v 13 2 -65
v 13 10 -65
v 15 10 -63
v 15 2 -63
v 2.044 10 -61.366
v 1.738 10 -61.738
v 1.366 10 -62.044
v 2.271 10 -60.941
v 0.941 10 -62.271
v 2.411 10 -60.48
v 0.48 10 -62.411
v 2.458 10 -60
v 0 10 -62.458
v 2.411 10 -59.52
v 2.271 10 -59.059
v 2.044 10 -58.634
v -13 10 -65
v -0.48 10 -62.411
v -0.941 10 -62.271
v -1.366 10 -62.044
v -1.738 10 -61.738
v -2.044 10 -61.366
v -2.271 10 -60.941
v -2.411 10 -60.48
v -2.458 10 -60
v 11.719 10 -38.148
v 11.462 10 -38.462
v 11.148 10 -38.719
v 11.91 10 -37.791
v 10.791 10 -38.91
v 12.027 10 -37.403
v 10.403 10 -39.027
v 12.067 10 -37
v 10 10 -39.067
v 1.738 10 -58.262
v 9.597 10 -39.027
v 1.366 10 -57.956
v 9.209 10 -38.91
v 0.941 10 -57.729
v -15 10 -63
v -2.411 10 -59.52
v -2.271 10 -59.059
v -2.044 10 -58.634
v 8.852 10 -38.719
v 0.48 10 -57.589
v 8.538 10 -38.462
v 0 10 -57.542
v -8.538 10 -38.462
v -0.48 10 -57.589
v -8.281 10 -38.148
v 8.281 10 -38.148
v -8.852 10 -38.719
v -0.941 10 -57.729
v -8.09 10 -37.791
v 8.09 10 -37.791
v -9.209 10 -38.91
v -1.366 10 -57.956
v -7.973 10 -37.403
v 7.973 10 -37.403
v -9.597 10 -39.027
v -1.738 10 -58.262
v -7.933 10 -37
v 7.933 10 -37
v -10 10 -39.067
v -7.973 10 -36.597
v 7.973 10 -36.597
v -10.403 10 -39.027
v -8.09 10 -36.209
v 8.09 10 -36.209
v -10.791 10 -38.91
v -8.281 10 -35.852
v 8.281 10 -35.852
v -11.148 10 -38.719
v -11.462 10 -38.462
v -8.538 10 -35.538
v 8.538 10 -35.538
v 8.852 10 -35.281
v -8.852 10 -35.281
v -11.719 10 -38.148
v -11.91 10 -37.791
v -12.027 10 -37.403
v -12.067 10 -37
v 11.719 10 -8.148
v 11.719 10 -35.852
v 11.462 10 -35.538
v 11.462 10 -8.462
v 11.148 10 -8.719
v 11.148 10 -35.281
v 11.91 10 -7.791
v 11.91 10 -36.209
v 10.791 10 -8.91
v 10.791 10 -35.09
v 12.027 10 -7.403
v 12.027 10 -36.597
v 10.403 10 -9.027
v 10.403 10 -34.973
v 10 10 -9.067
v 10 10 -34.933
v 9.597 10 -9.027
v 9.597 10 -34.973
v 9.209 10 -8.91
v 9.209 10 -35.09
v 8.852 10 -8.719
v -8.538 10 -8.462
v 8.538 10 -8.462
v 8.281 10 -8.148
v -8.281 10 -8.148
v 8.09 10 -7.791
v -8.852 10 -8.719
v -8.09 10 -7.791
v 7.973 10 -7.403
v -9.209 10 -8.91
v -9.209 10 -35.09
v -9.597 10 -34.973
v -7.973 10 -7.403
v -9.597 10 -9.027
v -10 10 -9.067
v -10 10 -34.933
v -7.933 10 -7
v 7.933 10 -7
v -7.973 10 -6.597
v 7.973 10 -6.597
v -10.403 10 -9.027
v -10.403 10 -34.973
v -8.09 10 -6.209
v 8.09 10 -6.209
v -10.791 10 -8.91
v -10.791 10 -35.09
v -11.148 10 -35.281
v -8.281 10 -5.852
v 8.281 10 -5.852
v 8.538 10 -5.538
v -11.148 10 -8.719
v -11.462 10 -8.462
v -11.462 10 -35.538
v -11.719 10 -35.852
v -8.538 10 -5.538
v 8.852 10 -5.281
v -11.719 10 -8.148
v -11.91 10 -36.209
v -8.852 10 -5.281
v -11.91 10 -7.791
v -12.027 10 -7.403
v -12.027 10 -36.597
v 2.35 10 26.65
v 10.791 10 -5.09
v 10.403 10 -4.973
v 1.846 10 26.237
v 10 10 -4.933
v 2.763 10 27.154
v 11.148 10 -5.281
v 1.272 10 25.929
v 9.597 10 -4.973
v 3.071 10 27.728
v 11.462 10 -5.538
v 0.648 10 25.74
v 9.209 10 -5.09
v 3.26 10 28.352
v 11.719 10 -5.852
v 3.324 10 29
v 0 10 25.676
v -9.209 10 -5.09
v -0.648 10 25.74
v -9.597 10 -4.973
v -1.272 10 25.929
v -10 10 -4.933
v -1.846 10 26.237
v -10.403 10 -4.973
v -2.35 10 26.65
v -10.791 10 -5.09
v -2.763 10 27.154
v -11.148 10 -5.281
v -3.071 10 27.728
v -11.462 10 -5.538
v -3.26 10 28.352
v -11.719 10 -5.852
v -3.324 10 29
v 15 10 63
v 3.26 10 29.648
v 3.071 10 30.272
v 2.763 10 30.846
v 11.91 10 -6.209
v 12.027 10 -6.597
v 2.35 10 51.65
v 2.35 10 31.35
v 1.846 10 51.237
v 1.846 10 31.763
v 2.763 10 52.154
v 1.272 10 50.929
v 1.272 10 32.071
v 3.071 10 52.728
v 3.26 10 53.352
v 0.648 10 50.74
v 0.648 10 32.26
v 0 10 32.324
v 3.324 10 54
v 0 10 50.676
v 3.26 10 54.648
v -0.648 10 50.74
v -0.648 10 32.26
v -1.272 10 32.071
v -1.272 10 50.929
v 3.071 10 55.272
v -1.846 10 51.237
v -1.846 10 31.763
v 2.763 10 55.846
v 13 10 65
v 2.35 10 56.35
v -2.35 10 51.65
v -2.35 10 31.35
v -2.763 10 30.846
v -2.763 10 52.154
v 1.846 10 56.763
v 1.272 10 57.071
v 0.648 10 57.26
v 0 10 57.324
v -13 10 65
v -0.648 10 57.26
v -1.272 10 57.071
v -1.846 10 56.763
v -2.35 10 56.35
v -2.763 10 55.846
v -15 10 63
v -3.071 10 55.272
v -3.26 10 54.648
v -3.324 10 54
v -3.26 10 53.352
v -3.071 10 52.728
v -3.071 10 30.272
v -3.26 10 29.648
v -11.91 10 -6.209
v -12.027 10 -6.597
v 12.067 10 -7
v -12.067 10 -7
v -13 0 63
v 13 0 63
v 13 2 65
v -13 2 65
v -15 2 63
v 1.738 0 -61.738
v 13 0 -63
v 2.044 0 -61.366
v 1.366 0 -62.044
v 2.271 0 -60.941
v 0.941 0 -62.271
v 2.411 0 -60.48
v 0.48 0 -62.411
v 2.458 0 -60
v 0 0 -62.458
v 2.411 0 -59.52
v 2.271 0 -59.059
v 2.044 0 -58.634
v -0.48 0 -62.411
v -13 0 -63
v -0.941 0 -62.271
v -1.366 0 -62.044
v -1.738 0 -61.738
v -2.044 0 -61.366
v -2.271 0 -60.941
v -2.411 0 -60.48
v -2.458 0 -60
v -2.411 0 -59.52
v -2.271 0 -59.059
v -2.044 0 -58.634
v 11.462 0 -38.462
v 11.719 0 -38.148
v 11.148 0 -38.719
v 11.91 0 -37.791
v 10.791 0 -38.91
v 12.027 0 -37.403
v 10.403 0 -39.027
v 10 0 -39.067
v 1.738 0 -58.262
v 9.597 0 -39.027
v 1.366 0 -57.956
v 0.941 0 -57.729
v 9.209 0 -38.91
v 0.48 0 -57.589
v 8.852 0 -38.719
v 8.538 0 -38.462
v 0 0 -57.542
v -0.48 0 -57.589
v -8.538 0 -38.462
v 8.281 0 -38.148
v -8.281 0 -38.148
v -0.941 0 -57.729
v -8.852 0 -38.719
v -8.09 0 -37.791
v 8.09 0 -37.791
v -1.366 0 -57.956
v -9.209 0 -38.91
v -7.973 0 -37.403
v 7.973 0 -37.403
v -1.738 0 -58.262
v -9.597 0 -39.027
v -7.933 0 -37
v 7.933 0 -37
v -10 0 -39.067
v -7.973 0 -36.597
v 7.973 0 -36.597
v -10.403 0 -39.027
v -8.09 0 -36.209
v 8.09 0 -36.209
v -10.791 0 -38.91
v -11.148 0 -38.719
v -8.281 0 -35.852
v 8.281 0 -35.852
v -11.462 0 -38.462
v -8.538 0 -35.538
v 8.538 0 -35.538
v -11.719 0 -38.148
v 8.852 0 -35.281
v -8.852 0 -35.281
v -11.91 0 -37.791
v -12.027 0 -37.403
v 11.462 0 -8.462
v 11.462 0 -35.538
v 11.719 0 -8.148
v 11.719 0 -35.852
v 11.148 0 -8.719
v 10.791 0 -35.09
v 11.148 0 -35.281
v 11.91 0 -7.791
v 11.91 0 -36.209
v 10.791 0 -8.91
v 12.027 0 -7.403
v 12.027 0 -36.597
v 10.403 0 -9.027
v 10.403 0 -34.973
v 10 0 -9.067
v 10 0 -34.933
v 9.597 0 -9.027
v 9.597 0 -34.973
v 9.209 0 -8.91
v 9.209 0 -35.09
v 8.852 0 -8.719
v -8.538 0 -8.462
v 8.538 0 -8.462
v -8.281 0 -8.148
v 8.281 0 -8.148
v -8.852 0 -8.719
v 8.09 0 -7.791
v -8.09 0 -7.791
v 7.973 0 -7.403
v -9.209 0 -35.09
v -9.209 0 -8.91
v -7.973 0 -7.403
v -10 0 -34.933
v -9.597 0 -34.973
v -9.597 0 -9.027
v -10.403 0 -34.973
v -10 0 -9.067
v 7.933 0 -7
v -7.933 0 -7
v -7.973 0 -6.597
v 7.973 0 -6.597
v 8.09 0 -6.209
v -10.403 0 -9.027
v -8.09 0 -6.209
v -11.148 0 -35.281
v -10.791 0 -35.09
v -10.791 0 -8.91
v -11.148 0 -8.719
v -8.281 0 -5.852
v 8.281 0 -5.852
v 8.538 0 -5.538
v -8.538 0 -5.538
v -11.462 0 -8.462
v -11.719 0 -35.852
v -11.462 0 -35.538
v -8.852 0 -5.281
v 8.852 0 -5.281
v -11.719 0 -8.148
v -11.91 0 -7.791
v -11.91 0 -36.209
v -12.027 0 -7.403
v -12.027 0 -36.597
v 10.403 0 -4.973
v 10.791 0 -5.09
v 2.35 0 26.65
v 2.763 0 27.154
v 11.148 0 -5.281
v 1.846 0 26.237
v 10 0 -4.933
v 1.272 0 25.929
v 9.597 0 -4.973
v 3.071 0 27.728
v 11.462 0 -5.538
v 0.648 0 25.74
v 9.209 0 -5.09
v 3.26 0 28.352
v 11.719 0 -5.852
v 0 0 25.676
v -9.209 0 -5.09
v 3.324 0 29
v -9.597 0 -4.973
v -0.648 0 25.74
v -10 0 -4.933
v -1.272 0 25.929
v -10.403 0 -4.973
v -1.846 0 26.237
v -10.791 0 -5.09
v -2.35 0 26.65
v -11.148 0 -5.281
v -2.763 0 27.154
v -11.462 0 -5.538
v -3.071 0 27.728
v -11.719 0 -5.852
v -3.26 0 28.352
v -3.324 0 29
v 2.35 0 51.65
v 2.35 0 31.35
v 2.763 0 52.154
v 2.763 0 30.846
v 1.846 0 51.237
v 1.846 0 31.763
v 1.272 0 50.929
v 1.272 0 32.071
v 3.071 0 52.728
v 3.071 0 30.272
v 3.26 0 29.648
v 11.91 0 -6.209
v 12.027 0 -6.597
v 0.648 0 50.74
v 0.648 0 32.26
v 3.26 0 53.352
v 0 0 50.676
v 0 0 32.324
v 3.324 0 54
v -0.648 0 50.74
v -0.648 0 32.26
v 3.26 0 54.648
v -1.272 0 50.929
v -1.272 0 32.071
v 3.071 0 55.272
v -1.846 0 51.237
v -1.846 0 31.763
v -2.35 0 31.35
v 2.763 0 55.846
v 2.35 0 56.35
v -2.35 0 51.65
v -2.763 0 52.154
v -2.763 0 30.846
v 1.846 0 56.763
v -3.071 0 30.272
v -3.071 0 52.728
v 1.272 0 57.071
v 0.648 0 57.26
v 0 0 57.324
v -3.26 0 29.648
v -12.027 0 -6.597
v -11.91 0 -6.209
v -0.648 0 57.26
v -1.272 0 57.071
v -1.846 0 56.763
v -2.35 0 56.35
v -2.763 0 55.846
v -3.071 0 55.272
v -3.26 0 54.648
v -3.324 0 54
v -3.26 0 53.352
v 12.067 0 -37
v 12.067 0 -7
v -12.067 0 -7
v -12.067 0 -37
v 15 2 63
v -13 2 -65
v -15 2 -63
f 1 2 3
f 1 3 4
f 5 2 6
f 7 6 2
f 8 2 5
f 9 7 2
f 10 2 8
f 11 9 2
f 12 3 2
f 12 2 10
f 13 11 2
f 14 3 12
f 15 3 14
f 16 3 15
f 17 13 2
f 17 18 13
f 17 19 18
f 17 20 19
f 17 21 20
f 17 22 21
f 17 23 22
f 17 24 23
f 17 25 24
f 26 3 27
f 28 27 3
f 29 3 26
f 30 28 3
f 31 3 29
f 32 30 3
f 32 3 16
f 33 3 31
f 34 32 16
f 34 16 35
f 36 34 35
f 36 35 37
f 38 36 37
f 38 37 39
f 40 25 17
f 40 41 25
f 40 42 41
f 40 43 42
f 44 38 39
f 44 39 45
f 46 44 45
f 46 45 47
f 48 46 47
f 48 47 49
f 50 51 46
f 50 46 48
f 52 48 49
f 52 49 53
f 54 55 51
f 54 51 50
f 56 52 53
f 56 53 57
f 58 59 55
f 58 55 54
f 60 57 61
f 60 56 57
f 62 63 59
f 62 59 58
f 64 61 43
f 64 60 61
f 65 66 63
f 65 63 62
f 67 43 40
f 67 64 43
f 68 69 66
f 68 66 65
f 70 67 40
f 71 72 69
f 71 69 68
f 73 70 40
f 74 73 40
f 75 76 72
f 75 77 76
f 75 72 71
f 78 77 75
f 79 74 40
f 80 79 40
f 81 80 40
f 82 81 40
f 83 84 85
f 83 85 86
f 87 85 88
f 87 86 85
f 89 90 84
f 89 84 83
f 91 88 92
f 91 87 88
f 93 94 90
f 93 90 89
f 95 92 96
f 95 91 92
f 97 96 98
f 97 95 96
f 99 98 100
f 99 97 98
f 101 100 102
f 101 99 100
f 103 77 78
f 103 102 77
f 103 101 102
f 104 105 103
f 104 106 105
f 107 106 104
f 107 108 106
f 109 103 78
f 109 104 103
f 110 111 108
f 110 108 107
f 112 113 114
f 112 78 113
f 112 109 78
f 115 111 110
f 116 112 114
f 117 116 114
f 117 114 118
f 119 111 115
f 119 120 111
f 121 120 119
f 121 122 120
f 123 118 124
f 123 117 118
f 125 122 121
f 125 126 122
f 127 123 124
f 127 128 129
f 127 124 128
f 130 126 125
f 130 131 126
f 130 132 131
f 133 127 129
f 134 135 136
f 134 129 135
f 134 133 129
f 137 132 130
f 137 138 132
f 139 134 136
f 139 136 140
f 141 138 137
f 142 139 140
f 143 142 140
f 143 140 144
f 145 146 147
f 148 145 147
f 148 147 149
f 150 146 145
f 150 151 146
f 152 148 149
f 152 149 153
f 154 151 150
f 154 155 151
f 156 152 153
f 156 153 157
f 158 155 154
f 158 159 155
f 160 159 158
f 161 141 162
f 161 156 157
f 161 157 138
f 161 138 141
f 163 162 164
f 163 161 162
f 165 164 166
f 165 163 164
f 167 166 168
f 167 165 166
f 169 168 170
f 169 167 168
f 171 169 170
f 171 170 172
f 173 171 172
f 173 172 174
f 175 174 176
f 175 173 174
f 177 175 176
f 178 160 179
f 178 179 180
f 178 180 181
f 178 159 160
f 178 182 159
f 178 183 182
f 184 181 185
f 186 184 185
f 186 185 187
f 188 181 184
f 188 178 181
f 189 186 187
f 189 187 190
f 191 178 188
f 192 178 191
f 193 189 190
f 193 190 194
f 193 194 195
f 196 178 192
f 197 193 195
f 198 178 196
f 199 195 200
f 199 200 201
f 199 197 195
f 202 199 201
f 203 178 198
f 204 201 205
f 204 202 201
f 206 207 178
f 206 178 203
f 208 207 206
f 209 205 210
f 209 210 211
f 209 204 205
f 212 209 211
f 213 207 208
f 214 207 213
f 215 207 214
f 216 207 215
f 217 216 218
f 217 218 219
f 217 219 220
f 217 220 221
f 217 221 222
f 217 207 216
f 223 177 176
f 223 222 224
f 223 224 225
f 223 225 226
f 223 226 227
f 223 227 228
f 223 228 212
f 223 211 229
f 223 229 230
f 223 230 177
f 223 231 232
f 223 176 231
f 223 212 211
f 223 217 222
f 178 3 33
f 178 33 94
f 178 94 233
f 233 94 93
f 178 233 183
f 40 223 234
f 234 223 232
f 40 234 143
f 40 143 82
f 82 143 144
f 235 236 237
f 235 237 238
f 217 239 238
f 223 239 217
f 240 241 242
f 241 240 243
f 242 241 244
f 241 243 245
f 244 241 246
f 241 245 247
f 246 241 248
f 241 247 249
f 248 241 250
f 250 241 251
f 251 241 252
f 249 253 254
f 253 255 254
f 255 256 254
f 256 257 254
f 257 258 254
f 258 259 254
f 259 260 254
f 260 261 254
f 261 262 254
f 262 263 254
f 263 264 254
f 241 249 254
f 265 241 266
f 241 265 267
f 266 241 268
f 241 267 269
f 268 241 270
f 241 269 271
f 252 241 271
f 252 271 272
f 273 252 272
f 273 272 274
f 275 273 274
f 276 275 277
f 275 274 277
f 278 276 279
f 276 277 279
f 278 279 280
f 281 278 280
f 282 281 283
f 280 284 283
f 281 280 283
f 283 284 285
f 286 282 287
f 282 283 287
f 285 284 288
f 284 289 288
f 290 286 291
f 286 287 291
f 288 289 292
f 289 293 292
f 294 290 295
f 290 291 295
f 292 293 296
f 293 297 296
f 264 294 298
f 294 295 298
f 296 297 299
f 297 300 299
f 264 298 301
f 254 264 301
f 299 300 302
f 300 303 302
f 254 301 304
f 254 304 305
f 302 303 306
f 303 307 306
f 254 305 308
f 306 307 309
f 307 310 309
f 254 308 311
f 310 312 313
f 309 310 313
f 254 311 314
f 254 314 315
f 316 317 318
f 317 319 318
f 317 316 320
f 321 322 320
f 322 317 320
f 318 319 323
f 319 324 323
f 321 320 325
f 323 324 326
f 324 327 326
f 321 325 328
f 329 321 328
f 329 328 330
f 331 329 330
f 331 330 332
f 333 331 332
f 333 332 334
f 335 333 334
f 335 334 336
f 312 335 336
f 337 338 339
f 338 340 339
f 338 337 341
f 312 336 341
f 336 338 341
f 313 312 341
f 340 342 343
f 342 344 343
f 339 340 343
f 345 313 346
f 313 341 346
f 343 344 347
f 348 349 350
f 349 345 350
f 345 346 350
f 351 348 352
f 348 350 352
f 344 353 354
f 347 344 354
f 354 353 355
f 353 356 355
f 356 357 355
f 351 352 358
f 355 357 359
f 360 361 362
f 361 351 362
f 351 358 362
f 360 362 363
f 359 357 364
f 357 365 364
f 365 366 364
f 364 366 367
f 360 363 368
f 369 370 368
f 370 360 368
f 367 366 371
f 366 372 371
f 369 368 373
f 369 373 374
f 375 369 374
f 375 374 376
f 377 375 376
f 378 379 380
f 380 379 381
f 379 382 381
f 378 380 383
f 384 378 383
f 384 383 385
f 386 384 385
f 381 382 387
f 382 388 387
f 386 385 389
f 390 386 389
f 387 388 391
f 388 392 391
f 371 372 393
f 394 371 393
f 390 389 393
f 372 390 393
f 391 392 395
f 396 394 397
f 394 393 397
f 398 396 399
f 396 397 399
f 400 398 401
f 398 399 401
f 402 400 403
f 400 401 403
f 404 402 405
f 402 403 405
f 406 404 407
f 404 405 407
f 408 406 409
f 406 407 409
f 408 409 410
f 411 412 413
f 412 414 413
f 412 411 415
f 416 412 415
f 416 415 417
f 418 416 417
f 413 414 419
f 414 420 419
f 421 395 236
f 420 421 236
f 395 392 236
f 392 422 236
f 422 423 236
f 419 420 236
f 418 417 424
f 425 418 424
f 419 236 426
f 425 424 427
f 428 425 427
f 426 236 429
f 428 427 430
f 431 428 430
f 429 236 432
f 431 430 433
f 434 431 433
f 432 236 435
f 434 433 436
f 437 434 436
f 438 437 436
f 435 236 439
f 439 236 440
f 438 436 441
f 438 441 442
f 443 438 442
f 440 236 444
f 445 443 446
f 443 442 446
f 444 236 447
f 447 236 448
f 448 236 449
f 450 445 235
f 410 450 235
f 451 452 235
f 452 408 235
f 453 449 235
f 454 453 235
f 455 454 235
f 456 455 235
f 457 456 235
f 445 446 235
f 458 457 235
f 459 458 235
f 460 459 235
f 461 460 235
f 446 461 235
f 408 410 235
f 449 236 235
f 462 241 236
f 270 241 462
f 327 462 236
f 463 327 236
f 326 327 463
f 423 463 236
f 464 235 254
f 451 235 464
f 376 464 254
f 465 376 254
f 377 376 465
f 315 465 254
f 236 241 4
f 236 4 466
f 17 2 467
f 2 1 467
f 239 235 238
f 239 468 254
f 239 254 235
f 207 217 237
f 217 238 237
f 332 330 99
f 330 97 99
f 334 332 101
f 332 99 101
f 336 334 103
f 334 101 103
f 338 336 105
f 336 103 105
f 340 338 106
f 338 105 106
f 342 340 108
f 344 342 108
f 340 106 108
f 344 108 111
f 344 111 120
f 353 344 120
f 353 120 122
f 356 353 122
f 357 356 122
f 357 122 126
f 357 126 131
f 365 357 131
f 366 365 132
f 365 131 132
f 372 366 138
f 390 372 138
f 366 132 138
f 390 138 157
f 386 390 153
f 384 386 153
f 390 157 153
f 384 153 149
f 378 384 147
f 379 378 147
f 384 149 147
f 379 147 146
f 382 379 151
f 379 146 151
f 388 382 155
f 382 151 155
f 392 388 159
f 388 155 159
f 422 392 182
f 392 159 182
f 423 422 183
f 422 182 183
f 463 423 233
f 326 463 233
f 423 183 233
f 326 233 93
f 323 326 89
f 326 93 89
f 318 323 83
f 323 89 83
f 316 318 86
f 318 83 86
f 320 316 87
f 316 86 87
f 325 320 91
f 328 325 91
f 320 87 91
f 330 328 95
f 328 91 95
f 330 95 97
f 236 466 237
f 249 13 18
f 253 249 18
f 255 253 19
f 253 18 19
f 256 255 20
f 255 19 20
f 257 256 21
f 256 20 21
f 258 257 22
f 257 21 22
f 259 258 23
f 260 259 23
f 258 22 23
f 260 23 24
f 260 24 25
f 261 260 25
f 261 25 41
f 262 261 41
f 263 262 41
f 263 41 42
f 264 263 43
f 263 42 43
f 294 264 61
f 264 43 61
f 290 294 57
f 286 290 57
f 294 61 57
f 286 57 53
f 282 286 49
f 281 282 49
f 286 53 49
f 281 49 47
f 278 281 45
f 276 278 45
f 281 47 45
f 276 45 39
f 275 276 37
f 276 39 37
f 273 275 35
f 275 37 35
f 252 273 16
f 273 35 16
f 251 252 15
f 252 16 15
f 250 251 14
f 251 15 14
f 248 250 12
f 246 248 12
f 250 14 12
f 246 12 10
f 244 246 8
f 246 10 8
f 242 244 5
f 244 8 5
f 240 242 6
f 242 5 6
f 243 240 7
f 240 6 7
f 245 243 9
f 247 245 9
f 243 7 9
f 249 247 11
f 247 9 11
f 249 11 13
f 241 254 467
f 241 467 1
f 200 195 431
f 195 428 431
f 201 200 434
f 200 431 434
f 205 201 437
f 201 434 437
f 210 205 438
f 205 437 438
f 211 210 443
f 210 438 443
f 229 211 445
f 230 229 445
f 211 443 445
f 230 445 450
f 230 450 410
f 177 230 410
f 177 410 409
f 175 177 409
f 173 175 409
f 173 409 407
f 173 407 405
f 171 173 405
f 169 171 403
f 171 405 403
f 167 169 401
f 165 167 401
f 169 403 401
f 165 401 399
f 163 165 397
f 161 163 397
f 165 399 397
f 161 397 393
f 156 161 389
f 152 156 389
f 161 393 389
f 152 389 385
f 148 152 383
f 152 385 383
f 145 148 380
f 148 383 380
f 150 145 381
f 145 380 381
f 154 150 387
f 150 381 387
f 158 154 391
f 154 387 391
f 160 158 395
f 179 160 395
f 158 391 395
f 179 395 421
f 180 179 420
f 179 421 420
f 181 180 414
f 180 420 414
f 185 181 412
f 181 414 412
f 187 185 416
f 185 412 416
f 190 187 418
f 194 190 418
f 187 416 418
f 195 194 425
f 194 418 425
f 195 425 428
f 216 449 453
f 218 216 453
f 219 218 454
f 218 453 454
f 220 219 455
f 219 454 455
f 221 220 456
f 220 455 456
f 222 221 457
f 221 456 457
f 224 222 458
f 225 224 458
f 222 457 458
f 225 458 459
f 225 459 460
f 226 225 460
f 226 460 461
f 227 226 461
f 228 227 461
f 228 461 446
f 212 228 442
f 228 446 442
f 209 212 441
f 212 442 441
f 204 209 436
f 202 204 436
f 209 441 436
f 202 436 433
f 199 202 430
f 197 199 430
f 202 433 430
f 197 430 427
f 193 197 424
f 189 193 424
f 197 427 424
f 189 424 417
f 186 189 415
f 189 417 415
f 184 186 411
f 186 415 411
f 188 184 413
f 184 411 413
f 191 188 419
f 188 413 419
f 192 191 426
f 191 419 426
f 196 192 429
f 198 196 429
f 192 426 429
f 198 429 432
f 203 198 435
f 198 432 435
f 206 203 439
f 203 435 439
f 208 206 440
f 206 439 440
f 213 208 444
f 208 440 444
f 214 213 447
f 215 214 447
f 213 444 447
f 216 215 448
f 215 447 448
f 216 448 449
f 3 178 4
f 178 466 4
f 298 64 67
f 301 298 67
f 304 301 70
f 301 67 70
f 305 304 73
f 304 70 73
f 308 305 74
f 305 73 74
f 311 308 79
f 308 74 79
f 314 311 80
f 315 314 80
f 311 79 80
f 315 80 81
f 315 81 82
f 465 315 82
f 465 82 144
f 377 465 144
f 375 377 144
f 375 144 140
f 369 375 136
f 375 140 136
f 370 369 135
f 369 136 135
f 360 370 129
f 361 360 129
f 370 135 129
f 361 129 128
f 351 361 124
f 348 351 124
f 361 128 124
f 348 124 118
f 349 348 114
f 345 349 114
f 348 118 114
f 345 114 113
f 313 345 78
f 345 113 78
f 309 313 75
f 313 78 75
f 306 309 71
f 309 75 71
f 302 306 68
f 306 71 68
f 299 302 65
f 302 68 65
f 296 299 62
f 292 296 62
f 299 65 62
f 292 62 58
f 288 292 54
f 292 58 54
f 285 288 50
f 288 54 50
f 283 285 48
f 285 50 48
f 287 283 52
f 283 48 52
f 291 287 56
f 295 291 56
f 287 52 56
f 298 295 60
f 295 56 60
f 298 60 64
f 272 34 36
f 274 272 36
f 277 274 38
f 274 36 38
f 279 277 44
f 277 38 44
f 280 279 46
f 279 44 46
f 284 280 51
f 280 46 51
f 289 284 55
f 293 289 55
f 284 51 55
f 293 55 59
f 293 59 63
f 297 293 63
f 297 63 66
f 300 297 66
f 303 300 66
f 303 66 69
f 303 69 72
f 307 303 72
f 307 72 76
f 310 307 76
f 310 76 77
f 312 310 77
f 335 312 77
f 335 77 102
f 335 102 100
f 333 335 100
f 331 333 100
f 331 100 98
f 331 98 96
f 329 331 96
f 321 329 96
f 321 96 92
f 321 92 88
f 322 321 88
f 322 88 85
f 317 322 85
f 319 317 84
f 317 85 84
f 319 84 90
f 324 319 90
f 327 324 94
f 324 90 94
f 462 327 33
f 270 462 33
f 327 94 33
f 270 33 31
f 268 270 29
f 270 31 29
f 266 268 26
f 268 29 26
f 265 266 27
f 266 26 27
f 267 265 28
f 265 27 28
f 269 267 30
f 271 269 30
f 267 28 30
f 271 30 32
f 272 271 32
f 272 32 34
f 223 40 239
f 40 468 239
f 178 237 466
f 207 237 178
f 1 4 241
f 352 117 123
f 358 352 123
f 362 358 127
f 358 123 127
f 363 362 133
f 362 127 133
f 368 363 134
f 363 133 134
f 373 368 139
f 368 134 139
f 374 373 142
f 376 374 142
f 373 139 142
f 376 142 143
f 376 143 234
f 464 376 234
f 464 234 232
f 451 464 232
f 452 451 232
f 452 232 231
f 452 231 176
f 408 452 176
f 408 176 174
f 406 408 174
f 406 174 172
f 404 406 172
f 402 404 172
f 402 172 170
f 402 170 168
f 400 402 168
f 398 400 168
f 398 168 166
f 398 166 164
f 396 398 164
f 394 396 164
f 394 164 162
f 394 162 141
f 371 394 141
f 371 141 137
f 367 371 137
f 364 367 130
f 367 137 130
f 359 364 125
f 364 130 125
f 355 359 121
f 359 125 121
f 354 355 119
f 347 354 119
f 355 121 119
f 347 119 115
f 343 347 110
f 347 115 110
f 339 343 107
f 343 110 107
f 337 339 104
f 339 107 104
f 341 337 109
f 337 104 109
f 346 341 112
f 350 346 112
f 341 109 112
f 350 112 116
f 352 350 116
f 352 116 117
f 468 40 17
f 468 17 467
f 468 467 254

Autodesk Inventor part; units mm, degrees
ref_plane "YZ Plane" through (0, 0, 0) normal (1, 0, 0) x (0, 1, 0)
ref_plane "XZ Plane" through (0, 0, 0) normal (0, 1, 0) x (-1, 0, 0)
ref_plane "XY Plane" through (0, 0, 0) normal (0, 0, 1) x (1, 0, 0)
sketch "Sketch1" plane through (0, 0, 0) normal (0, 1, 0) x (-1, 0, 0)
  line L0 (-15, -65) -> (15, -65)
  line L1 (15, -65) -> (15, 65)
  line L2 (15, 65) -> (-15, 65)
  line L3 (-15, 65) -> (-15, -65)
  line L4 (-15, -65) -> (15, 65) construction
  line L5 (15, -65) -> (-15, 65) construction
  point P0 (0, 0)
  dimension "d0" = 30
  dimension "d1" = 130
extrude "Extrusion1" add sketch "Sketch1" along normal blind 10
sketch "Sketch2" plane through (0, 10, 0) normal (0, 1, 0) x (1, 0, 0)
  line L0 (15, 65) -> (-15, 65) projected
  point P0 (0, 0)
  point P1 (0, -29)
  point P2 (0, -54)
  dimension "d4" = 94
  dimension "d5" = 25
hole "Hole1" at (0, 10, 29) at (0, 10, 54) direction (0, -1, 0) diameter 6.647 depth 22.2 tip angle 118 thread size "M8x1.25" class "6H" standard "ISO Metric profile"
sketch "Sketch3" plane through (0, 0, 0) normal (0, -1, 0) x (1, 0, 0)
  line L0 (15, -65) -> (-15, -65) projected
  line L1 (-15, -65) -> (-15, 65) projected
  point P0 (0, 0)
  point P1 (0, -60)
  dimension "d13" = 5
  dimension "d14" = 15
hole "Hole2" at (0, 0, -60) direction (0, 1, 0) diameter 4.917 end through all thread size "M6x1" class "6H" standard "ISO Metric profile"
sketch "Sketch4" plane through (0, 0, 0) normal (0, -1, 0) x (1, 0, 0)
  line L0 (10, -37) -> (-10, -37) construction
  line L1 (-10, -37) -> (-10, -7) construction
  line L2 (-10, -7) -> (10, -7) construction
  line L3 (10, -7) -> (10, -37) construction
  line L4 (15, -65) -> (-15, -65) construction
  line L5 (15, 65) -> (15, -65) construction
  point P0 (0, 0)
  dimension "d22" = 20
  dimension "d23" = 30
  dimension "d24" = 28
  dimension "d25" = 5
hole "Hole3" at (10, 0, -37) at (-10, 0, -37) at (-10, 0, -7) at (10, 0, -7) direction (0, 1, 0) diameter 4.134 end through all thread size "M5x0.8" class "6H" standard "ISO Metric profile"
chamfer "Chamfer1" distance 2 angle 45 8 edges at (15, 5, -65) (-15, 5, -65) (15, 5, 65) (15, 0, 0) (0, 0, -65) (-15, 0, 0) (0, 0, 65) (-15, 5, 65)
properties part number "Horizontal_support" material "Stainless Steel"
